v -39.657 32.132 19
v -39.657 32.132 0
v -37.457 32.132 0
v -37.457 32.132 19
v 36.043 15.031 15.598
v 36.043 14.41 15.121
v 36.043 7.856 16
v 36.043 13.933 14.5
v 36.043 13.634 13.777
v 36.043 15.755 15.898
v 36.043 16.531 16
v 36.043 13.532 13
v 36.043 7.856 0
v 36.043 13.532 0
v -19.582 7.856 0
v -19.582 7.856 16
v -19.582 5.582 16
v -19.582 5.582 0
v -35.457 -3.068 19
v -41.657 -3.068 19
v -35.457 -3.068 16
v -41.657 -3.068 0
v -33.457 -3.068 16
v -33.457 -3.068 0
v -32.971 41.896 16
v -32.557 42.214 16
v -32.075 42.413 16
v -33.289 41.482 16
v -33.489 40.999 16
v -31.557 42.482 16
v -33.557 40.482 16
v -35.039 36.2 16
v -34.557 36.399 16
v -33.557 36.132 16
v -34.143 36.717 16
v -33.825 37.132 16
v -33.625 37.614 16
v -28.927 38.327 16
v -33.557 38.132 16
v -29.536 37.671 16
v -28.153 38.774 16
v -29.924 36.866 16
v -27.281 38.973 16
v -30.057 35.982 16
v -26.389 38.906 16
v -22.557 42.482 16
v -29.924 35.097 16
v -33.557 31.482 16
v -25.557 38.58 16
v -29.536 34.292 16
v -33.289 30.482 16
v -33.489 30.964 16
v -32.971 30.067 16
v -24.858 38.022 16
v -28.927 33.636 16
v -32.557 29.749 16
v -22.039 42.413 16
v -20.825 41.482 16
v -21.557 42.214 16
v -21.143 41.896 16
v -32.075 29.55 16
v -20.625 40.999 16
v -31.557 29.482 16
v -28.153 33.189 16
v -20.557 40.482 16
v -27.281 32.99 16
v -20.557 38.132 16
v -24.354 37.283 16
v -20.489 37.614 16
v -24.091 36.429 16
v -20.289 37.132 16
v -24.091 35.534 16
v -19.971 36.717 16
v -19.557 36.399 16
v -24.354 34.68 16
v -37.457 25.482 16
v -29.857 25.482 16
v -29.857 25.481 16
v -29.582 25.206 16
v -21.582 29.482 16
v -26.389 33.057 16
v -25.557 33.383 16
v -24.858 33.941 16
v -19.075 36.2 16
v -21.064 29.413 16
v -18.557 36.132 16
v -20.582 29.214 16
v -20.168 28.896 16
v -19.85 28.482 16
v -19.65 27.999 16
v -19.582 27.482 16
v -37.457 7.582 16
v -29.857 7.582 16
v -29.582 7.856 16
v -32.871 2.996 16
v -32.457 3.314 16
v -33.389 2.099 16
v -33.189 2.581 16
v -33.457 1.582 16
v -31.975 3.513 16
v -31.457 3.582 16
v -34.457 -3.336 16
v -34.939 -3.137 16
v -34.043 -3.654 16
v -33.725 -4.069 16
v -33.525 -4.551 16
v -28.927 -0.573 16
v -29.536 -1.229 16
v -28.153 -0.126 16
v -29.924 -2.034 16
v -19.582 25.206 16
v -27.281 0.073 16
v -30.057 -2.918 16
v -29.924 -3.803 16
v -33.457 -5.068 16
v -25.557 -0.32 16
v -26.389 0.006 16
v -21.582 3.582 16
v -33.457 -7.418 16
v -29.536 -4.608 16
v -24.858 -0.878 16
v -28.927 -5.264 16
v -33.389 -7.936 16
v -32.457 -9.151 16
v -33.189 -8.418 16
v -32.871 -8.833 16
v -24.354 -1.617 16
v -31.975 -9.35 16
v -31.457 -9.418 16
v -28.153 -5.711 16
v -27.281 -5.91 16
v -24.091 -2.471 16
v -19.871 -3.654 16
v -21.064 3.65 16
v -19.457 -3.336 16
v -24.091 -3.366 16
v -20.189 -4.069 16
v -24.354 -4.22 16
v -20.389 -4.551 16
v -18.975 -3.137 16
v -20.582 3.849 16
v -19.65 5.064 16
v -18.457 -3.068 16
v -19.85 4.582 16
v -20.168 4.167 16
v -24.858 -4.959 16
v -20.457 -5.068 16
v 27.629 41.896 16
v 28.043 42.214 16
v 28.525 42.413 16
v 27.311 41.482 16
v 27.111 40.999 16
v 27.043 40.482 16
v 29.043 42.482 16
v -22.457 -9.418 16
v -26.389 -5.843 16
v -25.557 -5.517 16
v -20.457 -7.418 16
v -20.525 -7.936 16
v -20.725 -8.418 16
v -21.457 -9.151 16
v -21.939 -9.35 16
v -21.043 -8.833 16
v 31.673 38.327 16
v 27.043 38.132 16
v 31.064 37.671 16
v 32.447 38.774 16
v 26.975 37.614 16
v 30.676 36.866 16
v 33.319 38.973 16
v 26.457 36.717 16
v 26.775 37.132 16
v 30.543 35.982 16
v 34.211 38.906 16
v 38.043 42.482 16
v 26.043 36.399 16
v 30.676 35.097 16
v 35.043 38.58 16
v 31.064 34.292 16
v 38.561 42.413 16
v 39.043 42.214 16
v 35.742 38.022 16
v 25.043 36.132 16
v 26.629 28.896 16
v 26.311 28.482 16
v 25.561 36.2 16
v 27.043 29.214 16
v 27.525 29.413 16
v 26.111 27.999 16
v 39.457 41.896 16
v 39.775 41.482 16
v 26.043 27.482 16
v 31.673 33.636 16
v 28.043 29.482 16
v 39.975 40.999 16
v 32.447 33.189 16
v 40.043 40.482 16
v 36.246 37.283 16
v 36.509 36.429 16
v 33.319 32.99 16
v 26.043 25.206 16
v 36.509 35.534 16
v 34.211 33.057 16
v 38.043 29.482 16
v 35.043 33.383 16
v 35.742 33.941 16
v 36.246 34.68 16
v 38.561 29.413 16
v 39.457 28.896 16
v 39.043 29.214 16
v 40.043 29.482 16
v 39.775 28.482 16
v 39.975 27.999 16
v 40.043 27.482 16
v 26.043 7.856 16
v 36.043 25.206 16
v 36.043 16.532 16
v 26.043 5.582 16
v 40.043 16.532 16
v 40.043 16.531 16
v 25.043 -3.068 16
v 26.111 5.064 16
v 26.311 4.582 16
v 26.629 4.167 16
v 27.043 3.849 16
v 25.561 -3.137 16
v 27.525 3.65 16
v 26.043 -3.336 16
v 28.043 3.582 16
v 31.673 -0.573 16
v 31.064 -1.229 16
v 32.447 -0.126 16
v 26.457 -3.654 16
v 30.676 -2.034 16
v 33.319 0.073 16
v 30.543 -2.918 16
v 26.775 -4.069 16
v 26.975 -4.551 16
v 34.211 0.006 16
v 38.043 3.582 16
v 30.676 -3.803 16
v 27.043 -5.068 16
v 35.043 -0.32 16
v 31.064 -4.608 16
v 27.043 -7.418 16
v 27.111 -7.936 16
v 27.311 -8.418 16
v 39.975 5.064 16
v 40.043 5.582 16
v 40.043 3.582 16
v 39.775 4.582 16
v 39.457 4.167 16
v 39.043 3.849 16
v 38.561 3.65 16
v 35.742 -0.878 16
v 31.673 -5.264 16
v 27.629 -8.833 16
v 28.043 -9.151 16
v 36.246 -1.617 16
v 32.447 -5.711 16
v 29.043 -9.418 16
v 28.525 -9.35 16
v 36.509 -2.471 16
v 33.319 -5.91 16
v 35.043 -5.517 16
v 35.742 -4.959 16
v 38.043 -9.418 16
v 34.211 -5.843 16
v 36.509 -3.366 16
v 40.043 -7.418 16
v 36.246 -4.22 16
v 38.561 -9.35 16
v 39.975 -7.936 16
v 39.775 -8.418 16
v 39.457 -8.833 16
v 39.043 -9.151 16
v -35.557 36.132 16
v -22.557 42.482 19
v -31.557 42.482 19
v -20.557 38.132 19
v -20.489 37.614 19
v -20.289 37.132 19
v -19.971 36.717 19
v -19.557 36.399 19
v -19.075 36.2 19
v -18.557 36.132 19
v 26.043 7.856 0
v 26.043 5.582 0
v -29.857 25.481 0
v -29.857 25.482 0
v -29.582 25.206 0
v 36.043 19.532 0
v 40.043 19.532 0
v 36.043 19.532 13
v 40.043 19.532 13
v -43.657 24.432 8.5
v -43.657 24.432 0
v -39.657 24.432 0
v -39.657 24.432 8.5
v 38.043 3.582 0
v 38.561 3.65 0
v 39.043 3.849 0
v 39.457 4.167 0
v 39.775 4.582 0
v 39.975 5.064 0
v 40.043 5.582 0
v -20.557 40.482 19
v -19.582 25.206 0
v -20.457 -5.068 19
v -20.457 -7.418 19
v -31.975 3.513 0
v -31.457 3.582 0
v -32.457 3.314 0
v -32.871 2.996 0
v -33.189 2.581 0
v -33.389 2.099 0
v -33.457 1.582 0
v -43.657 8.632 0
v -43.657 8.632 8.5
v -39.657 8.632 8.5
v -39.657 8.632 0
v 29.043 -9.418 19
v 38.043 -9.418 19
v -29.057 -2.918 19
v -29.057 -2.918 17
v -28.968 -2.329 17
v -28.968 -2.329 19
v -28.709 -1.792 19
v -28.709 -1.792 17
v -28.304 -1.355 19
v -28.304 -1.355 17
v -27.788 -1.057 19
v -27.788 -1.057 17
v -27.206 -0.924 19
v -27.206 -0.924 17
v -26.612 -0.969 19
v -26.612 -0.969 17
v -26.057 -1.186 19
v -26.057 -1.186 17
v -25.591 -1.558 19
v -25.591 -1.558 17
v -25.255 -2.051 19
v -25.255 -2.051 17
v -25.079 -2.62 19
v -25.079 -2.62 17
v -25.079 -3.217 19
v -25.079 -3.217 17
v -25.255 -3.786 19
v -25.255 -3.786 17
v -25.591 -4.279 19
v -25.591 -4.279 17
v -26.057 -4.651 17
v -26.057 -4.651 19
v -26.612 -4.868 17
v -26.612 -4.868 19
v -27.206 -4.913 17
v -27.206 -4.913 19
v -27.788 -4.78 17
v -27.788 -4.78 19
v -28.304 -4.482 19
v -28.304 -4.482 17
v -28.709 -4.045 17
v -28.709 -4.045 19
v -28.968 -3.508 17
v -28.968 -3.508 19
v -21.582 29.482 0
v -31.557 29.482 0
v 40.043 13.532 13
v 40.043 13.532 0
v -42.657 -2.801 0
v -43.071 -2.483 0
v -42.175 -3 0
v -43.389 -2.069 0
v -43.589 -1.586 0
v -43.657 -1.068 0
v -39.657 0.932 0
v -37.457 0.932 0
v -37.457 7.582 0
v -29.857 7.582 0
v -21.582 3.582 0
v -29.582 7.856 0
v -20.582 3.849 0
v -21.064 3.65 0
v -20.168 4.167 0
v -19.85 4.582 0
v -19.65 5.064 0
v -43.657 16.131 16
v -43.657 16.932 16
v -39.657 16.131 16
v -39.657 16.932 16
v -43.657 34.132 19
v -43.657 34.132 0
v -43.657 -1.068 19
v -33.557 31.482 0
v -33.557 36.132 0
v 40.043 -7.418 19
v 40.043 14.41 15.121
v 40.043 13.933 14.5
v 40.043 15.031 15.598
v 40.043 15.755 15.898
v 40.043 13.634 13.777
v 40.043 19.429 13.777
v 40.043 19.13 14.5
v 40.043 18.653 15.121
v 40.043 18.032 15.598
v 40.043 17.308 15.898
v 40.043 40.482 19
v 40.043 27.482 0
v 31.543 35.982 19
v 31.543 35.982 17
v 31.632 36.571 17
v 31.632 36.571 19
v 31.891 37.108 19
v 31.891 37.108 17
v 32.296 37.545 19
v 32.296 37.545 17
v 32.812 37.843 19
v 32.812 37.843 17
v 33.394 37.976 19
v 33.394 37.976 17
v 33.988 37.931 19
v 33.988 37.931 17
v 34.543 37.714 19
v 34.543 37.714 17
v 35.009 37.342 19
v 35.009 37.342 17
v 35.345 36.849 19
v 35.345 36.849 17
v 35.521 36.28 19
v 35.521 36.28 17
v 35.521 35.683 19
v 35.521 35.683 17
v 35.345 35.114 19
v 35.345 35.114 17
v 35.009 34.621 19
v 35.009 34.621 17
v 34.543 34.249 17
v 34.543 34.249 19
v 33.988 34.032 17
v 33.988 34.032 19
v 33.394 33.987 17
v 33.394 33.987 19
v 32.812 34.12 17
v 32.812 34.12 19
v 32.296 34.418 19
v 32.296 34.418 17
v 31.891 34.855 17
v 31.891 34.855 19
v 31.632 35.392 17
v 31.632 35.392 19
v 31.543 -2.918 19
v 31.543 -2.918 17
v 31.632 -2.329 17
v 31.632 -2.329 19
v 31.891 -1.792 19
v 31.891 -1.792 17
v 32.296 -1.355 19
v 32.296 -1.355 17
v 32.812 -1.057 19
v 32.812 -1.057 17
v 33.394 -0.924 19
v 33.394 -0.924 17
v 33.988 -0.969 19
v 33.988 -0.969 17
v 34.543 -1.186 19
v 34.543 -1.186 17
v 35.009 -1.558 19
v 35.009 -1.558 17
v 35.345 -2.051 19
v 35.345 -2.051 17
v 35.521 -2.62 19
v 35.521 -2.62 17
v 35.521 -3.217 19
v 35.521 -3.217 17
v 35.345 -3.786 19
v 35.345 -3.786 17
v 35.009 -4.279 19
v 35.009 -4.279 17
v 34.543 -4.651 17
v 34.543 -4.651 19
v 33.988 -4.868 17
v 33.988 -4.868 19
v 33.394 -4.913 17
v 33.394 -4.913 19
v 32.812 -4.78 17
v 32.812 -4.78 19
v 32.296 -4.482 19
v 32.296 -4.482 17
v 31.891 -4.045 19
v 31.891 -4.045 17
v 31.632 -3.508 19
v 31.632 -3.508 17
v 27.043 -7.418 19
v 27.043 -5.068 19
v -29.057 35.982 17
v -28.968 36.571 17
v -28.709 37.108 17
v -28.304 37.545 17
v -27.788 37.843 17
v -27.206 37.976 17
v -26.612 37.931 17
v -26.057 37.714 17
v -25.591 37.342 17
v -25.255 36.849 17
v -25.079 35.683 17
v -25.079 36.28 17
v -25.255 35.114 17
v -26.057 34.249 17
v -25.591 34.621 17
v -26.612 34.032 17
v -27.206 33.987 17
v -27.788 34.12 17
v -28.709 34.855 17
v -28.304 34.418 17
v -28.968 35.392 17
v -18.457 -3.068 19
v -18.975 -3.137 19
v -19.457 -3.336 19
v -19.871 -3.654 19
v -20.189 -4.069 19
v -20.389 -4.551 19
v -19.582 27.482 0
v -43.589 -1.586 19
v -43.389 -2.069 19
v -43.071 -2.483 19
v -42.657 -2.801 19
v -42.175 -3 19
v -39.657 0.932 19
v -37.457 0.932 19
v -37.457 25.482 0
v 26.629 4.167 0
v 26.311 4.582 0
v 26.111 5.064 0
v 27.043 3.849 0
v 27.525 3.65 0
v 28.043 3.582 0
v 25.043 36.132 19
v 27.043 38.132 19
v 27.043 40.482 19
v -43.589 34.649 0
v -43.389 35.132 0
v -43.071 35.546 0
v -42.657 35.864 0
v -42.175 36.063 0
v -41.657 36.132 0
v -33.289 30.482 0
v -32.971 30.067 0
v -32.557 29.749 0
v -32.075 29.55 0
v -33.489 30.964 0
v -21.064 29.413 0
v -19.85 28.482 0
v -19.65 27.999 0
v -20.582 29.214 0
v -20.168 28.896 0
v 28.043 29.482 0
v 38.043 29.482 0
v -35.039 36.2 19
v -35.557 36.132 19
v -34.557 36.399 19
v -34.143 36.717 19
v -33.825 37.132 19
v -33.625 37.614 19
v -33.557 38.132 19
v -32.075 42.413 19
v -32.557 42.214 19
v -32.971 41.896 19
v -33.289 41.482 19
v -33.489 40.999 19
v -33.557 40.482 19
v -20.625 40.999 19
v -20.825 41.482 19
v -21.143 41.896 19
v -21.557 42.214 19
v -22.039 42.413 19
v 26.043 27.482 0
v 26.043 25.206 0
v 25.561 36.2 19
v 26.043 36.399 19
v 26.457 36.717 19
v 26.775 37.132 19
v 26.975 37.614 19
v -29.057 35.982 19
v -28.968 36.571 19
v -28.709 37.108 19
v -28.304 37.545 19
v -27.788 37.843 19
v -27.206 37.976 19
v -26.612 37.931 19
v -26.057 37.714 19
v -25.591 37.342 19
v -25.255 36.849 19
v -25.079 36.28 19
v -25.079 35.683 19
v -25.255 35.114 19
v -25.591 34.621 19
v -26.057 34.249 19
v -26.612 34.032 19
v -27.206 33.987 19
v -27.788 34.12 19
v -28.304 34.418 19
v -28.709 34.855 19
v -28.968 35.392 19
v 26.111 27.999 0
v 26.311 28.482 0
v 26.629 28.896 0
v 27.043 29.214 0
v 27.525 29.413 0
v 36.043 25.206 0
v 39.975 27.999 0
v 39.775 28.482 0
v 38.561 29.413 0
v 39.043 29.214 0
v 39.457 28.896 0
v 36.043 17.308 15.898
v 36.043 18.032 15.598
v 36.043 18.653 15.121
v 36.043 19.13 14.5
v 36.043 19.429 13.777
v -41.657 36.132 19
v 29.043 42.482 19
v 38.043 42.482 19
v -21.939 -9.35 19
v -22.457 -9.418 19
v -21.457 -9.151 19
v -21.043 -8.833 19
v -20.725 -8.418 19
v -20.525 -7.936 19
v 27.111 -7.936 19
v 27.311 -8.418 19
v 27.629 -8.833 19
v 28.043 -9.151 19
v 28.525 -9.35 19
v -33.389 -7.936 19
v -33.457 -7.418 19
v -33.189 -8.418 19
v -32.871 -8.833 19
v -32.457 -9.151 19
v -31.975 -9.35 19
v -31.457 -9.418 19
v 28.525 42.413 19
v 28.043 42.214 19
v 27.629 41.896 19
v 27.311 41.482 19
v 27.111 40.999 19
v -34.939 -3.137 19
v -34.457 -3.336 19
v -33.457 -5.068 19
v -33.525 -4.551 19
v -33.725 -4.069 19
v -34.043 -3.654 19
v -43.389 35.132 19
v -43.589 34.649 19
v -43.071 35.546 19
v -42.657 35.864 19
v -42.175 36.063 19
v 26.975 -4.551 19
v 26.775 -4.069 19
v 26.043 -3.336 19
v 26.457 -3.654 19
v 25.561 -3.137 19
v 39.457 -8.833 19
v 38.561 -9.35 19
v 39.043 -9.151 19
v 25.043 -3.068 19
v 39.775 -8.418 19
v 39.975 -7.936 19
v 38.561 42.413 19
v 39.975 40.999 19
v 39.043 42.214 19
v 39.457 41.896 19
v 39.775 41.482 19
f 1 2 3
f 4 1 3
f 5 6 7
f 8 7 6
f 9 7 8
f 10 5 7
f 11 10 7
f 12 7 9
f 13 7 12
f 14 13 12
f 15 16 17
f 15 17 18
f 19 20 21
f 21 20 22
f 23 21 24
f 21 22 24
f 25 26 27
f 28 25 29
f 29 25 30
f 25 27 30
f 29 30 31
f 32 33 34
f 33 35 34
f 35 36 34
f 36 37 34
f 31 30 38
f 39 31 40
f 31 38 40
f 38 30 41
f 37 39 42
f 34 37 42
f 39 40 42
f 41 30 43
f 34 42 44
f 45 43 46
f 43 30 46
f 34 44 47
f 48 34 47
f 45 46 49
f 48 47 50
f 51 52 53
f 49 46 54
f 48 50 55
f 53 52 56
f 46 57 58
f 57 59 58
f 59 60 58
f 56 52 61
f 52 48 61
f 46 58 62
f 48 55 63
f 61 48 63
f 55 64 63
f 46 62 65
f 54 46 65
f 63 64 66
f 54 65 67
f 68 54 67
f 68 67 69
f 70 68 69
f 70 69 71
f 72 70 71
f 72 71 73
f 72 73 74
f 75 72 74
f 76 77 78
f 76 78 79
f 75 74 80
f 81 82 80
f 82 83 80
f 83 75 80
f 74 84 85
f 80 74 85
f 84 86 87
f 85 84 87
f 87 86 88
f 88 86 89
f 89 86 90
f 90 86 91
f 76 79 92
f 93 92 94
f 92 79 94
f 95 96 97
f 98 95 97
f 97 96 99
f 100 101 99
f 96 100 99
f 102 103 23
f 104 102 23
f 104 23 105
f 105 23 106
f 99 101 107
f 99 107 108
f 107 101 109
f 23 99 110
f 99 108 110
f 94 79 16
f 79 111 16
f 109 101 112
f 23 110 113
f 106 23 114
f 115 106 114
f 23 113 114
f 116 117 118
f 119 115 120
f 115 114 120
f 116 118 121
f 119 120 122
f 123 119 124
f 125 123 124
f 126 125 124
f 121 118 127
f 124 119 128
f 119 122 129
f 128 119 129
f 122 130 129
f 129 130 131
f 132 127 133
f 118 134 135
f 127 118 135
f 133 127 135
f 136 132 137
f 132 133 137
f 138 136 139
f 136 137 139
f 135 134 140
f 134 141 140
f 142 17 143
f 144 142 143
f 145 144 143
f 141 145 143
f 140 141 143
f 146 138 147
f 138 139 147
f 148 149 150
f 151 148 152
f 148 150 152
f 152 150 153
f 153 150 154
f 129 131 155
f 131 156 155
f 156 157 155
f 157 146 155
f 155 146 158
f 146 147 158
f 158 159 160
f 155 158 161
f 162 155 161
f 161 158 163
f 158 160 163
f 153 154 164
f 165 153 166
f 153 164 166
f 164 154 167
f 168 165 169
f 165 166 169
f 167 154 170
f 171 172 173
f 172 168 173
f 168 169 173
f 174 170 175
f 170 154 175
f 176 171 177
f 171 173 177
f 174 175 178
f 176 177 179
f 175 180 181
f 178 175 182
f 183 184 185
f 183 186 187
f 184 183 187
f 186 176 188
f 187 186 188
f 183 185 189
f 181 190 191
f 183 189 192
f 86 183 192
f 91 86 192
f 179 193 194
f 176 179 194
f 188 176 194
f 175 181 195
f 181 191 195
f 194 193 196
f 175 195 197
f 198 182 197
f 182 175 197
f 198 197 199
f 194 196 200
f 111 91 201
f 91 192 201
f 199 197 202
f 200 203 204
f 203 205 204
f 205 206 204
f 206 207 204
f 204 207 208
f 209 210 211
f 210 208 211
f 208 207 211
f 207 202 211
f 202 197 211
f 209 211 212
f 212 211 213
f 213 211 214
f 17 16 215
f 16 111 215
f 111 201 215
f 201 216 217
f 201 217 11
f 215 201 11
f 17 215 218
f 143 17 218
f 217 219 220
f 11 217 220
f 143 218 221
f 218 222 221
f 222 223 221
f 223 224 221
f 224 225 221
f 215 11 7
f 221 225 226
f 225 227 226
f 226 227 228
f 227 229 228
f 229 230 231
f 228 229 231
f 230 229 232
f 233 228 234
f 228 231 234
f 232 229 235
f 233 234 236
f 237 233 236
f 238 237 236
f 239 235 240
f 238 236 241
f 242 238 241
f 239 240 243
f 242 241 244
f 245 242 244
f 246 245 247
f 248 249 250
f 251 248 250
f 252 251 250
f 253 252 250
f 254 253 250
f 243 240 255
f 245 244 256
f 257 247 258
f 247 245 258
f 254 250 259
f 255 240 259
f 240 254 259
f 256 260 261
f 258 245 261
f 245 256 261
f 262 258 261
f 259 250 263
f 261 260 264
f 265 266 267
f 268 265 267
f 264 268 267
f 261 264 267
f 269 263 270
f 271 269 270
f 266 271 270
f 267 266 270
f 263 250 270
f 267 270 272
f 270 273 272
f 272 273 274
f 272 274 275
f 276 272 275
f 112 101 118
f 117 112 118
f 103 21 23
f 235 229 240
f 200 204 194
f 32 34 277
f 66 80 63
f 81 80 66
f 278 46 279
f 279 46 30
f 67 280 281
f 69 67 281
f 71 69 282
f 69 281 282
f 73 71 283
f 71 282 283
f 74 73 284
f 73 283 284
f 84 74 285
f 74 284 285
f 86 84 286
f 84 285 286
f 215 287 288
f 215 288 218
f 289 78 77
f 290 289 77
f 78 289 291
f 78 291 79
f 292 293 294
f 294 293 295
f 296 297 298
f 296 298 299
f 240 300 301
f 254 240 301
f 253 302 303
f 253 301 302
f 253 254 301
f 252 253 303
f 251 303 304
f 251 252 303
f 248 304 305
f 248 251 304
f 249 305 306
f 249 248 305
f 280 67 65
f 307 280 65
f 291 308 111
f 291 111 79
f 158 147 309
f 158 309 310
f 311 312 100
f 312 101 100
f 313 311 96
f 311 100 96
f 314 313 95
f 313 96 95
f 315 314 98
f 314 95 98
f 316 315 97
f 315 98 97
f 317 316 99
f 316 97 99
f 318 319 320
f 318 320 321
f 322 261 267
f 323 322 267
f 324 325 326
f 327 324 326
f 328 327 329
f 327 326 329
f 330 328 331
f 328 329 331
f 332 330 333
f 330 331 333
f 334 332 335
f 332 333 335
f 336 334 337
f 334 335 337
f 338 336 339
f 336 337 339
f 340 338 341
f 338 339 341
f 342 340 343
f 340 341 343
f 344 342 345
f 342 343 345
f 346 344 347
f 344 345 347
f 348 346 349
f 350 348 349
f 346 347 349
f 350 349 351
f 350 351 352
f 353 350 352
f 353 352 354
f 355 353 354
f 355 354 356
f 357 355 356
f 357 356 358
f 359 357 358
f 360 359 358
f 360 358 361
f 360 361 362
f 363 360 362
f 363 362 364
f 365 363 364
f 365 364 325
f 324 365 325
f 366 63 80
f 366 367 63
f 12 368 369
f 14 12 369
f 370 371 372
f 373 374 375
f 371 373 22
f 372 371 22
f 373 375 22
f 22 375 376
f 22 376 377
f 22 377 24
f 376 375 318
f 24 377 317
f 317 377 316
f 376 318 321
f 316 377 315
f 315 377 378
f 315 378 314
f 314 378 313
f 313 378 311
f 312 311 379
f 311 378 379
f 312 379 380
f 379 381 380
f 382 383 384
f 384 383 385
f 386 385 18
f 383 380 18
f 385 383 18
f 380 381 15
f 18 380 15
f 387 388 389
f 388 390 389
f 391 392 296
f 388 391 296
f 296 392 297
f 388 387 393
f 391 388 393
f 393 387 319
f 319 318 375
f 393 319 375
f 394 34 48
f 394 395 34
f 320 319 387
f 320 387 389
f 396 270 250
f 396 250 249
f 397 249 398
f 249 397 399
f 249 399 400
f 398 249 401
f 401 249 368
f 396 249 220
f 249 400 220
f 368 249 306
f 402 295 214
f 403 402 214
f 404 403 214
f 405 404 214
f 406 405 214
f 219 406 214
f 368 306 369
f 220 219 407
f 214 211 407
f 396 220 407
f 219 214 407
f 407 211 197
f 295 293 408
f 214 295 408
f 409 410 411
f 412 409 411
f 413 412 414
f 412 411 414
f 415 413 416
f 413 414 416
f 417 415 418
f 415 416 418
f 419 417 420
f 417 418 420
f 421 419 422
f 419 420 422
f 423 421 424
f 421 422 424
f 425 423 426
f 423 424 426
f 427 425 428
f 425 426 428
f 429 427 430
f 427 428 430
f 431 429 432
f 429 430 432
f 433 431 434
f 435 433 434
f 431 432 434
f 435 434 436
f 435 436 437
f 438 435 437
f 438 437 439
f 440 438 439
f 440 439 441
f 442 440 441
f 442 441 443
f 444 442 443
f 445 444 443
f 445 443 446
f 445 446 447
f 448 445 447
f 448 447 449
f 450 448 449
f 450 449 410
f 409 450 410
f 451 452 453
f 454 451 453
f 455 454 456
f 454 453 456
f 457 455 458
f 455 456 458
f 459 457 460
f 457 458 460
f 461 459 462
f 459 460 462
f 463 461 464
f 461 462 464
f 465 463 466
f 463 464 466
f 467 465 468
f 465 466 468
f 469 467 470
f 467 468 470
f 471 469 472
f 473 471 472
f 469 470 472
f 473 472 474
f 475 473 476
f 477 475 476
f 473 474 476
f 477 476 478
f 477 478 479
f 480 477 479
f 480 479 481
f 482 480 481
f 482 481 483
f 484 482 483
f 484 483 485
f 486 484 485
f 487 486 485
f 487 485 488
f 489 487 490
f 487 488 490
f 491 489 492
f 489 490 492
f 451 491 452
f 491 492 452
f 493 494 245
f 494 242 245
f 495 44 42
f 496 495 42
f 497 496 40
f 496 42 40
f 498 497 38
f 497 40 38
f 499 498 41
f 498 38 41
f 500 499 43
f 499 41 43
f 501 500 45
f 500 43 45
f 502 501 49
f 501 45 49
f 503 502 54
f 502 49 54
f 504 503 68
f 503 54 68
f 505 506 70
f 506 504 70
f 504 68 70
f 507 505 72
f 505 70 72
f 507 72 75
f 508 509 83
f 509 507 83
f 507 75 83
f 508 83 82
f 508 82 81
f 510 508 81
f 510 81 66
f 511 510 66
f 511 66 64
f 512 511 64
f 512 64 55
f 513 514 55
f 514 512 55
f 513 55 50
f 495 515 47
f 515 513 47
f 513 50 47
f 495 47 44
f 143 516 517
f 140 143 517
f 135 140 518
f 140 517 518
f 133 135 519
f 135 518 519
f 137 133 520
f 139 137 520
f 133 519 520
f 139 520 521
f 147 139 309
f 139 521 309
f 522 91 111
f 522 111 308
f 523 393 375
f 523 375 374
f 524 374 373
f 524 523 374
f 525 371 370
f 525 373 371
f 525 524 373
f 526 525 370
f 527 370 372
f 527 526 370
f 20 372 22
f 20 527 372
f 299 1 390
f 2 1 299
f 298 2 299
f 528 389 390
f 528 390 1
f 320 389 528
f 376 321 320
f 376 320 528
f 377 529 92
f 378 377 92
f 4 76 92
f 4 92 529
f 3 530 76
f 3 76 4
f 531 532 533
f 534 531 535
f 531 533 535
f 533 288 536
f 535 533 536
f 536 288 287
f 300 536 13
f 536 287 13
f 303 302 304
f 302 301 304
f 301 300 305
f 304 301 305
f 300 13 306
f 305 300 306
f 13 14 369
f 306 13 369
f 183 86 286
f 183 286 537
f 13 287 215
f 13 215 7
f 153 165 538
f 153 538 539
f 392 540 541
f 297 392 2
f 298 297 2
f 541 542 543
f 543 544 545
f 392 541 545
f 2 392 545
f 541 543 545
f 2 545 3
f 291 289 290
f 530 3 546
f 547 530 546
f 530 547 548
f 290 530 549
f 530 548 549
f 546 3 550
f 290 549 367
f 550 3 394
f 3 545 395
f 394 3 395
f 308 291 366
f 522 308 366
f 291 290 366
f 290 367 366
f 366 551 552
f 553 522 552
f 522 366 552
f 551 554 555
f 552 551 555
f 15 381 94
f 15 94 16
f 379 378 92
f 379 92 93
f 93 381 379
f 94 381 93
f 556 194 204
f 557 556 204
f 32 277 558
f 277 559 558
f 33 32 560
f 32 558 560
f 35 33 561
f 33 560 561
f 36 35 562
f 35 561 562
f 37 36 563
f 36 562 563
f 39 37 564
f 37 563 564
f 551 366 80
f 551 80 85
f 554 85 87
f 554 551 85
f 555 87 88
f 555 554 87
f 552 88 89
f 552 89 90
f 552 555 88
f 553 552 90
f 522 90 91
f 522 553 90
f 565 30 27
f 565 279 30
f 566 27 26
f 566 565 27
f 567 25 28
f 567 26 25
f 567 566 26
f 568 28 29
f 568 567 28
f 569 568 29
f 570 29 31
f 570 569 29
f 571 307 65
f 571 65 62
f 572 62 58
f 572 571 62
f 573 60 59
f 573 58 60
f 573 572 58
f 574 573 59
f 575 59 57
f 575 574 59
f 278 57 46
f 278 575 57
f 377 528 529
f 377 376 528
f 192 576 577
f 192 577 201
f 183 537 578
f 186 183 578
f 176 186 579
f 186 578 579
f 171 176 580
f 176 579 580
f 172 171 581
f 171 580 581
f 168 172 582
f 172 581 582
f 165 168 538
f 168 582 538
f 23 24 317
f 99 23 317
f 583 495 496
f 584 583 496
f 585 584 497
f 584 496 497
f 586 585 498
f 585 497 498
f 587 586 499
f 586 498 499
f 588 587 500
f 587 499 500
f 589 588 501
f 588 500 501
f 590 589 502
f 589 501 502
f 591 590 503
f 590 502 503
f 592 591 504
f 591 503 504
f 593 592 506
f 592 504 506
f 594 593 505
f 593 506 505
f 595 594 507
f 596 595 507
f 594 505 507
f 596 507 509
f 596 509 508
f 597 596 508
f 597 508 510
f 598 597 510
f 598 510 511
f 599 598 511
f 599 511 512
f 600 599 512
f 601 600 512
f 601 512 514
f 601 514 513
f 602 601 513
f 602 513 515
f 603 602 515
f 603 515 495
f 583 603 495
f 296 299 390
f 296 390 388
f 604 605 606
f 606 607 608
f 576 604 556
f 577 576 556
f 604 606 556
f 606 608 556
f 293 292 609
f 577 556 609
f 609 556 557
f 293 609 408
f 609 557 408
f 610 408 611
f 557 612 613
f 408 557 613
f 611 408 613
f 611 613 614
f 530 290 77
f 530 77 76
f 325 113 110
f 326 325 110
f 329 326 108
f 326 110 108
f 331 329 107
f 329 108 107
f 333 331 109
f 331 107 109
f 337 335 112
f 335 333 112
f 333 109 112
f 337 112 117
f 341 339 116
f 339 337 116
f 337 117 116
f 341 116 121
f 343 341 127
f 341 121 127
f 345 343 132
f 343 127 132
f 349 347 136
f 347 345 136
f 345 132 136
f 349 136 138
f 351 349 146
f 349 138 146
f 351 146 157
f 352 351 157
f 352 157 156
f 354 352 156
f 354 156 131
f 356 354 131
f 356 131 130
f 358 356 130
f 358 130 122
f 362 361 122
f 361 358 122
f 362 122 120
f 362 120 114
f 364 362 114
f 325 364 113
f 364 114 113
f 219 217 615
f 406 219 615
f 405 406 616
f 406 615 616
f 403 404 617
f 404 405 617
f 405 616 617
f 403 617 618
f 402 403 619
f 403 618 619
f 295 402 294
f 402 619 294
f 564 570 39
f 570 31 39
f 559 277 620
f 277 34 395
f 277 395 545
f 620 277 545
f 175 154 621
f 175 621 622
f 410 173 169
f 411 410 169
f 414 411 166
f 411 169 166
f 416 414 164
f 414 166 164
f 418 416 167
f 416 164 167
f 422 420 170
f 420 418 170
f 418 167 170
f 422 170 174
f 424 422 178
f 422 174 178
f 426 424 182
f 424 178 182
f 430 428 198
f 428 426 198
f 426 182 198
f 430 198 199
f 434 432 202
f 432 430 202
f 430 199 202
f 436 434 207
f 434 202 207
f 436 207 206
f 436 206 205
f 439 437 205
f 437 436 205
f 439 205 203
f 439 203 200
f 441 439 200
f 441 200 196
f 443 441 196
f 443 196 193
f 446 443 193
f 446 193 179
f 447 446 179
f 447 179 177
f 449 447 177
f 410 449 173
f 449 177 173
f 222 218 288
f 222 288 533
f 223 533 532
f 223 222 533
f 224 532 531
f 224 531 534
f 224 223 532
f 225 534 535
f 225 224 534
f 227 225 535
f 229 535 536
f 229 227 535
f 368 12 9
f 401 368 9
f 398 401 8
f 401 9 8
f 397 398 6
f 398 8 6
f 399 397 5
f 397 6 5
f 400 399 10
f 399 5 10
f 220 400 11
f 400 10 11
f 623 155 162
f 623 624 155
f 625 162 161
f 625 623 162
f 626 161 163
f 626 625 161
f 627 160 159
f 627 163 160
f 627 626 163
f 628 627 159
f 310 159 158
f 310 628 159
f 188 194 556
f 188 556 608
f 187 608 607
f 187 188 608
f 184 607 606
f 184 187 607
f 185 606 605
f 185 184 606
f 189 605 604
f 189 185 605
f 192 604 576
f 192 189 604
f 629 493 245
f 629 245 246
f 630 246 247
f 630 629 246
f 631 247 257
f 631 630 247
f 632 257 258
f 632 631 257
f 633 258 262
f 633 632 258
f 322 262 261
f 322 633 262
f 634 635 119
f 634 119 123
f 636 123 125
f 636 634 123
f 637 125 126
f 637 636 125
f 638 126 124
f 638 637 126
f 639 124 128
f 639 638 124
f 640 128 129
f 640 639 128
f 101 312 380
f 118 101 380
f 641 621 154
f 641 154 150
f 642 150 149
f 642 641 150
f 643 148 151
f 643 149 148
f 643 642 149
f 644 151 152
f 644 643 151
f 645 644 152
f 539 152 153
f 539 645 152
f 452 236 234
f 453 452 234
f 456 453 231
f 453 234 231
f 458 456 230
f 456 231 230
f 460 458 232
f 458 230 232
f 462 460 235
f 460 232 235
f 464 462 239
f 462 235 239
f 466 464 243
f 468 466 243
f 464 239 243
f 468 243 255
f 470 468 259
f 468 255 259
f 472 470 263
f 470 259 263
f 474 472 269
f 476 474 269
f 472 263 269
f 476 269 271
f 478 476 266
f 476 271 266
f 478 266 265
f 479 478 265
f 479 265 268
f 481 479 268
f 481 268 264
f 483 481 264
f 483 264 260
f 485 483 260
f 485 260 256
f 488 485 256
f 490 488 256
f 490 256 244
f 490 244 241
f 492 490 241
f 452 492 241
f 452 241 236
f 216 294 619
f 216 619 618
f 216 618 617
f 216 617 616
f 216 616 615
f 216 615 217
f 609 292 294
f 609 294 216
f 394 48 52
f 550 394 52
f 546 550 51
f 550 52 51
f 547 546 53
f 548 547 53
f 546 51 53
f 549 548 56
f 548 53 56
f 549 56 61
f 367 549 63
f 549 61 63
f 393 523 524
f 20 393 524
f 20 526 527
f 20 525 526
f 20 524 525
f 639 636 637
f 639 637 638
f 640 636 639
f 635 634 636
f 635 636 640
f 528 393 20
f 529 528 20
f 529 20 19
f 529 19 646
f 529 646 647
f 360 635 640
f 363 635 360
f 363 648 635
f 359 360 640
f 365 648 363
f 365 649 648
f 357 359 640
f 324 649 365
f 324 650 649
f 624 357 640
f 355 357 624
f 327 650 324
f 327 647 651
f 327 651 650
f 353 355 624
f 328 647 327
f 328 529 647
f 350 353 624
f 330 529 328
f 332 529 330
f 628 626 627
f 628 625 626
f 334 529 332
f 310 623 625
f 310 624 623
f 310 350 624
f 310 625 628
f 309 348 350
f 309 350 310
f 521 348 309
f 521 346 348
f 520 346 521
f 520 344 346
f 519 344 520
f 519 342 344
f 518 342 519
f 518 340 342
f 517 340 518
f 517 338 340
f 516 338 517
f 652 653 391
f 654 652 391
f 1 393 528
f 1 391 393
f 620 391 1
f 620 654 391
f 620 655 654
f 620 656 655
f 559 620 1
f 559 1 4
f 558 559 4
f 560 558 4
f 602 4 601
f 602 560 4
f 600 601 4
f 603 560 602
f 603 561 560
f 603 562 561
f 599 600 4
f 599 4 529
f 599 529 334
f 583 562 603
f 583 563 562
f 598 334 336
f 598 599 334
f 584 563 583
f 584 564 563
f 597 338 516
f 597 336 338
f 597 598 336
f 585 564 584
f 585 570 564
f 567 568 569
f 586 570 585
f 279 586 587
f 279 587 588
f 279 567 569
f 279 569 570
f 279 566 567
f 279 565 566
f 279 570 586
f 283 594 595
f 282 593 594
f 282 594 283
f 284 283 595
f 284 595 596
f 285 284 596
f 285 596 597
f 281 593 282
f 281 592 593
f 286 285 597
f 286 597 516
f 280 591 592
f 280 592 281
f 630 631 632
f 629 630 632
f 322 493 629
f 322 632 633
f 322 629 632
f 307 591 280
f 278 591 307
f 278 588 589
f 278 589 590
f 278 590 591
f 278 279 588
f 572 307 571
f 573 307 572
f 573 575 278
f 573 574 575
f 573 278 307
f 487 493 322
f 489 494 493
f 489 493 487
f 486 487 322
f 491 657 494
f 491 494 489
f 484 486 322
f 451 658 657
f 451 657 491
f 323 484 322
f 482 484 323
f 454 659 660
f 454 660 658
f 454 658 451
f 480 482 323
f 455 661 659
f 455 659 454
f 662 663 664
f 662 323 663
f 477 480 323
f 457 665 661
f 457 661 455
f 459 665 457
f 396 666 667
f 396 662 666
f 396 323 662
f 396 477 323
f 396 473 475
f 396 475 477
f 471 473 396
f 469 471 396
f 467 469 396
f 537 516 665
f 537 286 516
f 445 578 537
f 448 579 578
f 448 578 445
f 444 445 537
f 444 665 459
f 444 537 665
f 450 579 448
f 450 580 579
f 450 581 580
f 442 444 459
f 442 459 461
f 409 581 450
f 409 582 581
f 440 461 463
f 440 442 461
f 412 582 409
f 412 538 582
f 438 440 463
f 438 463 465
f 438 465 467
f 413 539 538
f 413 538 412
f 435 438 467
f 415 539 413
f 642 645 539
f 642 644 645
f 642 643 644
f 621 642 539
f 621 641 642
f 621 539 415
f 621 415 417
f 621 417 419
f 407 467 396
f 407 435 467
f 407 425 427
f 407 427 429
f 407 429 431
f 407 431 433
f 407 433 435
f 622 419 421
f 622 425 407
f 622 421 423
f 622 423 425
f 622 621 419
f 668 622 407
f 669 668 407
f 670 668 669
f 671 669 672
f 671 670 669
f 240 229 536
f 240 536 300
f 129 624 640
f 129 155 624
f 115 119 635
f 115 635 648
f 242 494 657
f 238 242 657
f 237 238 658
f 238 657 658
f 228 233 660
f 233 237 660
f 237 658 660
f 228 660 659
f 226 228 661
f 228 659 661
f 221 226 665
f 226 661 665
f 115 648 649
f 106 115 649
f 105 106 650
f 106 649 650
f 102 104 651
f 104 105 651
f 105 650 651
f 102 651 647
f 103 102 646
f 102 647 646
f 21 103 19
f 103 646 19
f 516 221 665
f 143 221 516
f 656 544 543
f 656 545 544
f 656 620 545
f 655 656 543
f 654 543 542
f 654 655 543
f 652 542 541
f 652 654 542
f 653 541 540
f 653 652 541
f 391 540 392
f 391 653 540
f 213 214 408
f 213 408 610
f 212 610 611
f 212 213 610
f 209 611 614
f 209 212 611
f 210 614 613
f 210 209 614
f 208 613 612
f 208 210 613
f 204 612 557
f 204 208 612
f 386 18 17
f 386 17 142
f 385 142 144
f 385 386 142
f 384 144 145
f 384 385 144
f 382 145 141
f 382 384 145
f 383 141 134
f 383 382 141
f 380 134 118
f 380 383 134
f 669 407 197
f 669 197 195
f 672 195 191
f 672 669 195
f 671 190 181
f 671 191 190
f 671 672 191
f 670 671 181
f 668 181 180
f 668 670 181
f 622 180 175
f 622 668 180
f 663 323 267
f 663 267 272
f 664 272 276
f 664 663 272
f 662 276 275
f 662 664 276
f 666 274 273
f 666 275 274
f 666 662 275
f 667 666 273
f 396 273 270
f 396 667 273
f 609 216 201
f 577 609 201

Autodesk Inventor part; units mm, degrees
ref_plane "YZ Plane" through (0, 0, 0) normal (1, 0, 0) x (0, 1, 0)
ref_plane "XZ Plane" through (0, 0, 0) normal (0, 1, 0) x (-1, 0, 0)
ref_plane "XY Plane" through (0, 0, 0) normal (0, 0, 1) x (1, 0, 0)
sketch "Sketch1" plane through (0, 0, 0) normal (0, 0, 1) x (1, 0, 0)
  line L0 (-33.557, 36.1315) -> (-43.657, 36.1315)
  line L1 (-43.657, 36.1315) -> (-43.657, -3.0685)
  line L2 (-43.657, -3.0685) -> (-33.457, -3.0685)
  line L3 (40.043, 3.5815) -> (40.043, 29.4815)
  line L4 (35.943, 25.1065) -> (35.943, 7.9565) construction
  line L5 (35.943, 7.9565) -> (-29.957, 7.9565) construction
  line L6 (35.943, 25.1065) -> (-29.957, 25.1065) construction
  line L7 (-37.557, 25.3815) -> (-29.957, 25.3815) construction
  line L8 (-29.957, 7.6815) -> (-29.957, 25.3815) construction
  line L9 (-37.557, 7.6815) -> (-29.957, 7.6815) construction
  line L10 (-37.557, 1.0315) -> (-37.557, 6.1295) construction
  line L11 (-39.557, 1.0315) -> (-37.557, 1.0315) construction
  line L12 (-39.557, 6.1295) -> (-39.557, 1.0315) construction
  line L13 (-39.557, 13.2232) -> (-39.557, 6.1295) construction
  line L14 (-39.557, 19.8398) -> (-39.557, 13.2232) construction
  line L15 (-39.557, 26.9336) -> (-39.557, 19.8398) construction
  line L16 (-39.557, 32.0315) -> (-39.557, 26.9336) construction
  line L17 (-39.557, 32.0315) -> (-37.557, 32.0315) construction
  line L18 (-37.557, 26.9336) -> (-37.557, 32.0315) construction
  line L19 (-37.557, 19.8398) -> (-37.557, 26.9336) construction
  line L20 (-37.557, 6.1295) -> (-37.557, 13.2232) construction
  line L21 (-33.557, 36.1315) -> (-33.557, 29.4815) construction
  line L22 (-33.557, 29.4815) -> (40.043, 29.4815) construction
  line L23 (35.943, 25.1065) -> (-29.957, 25.1065) construction
  line L24 (-29.957, 25.3815) -> (-29.957, 25.1065) construction
  line L25 (-29.957, 25.3815) -> (-37.557, 25.3815) construction
  line L26 (-37.557, 25.3815) -> (-37.557, 32.0315) construction
  line L27 (-37.557, 32.0315) -> (-39.557, 32.0315) construction
  line L28 (-39.557, 32.0315) -> (-39.557, 1.0315) construction
  line L29 (-39.557, 1.0315) -> (-37.557, 1.0315) construction
  line L30 (-37.557, 1.0315) -> (-37.557, 7.6815) construction
  line L31 (-37.557, 7.6815) -> (-29.957, 7.6815) construction
  line L32 (-29.957, 7.6815) -> (-29.957, 7.9565) construction
  line L33 (-29.957, 7.9565) -> (35.943, 7.9565) construction
  line L34 (35.943, 7.9565) -> (35.943, 25.1065) construction
  line L35 (-29.857, 7.8565) -> (36.043, 7.8565)
  line L36 (36.043, 7.8565) -> (36.043, 25.2065)
  line L37 (36.043, 25.2065) -> (-29.857, 25.2065)
  line L38 (-29.857, 25.2065) -> (-29.857, 25.4815)
  line L39 (-29.857, 25.4815) -> (-37.457, 25.4815)
  line L40 (-37.457, 25.4815) -> (-37.457, 32.1315)
  line L41 (-37.457, 32.1315) -> (-39.657, 32.1315)
  line L42 (-39.657, 32.1315) -> (-39.657, 0.9315)
  line L43 (-39.657, 0.9315) -> (-37.457, 0.9315)
  line L44 (-37.457, 0.9315) -> (-37.457, 7.5815)
  line L45 (-37.457, 7.5815) -> (-29.857, 7.5815)
  line L46 (-29.857, 7.5815) -> (-29.857, 7.8565)
  line L47 (-33.557, 36.1315) -> (-33.557, 29.4815)
  line L48 (-33.557, 29.4815) -> (40.043, 29.4815)
  line L49 (-33.457, -3.0685) -> (-33.457, 3.5815)
  line L50 (-33.457, 3.5815) -> (40.043, 3.5815)
  line L51 (-33.457, 36.1315) -> (-33.557, 36.1315)
  line L52 (-33.457, 36.1315) -> (-33.557, 36.1315)
  point P0 (0, 0)
  dimension "d6" = 0.1
  dimension "d7" = 4
  dimension "d8" = 4
  dimension "d9" = 4
  dimension "d10" = 4
  dimension "d11" = 4
  dimension "d12" = 4
  dimension "d13" = 4
  dimension "d14" = 4
extrude "Extrusion1" add sketch "Sketch1" along normal blind 16
sketch "Sketch2" plane through (0, 0, 16) normal (0, 0, 1) x (1, 0, 0)
  line L0 (-43.657, 36.1315) -> (-43.657, -3.0685) projected
  line L1 (-43.657, -3.0685) -> (-43.657, 36.1315)
  line L2 (40.043, 36.1315) -> (40.043, -3.0685)
  line L3 (-43.657, -3.0685) -> (-33.457, -3.0685) projected
  line L4 (40.043, 3.5815) -> (40.043, 29.4815) projected
  line L5 (40.043, 29.4815) -> (27.043, 29.4815) construction
  line L6 (27.043, 36.1315) -> (27.043, 42.4815)
  line L7 (27.043, 42.4815) -> (40.043, 42.4815)
  line L8 (40.043, 42.4815) -> (40.043, 29.4815)
  line L9 (-33.557, 29.4815) -> (-33.557, 36.1315) construction
  line L10 (-33.557, 29.4815) -> (-20.557, 29.4815) construction
  line L11 (-20.557, 36.1315) -> (-20.557, 42.4815)
  line L12 (-20.557, 42.4815) -> (-33.557, 42.4815)
  line L13 (-33.557, 42.4815) -> (-33.557, 36.1315)
  line L14 (-33.457, 3.5815) -> (40.043, 3.5815) construction
  line L15 (-20.557, 3.5815) -> (-20.457, 3.5815)
  line L16 (-20.457, -3.0685) -> (-20.457, -9.4185)
  line L17 (-20.457, -9.4185) -> (-33.457, -9.4185)
  line L18 (-33.457, -9.4185) -> (-33.457, -3.0685)
  line L19 (40.043, 3.5815) -> (27.043, 3.5815) construction
  line L20 (27.043, -3.0685) -> (27.043, -9.4185)
  line L21 (27.043, -9.4185) -> (40.043, -9.4185)
  line L22 (40.043, -9.4185) -> (40.043, 3.5815)
  line L23 (27.043, -3.0685) -> (-20.457, -3.0685)
  line L24 (-33.457, -3.0685) -> (-43.657, -3.0685)
  line L25 (-43.657, 36.1315) -> (-33.557, 36.1315)
  line L26 (-20.557, 36.1315) -> (27.043, 36.1315)
  point P0 (0, 0)
  point P1 (-38.557, -3.0685)
  point P2 (40.043, 16.5315)
  dimension "d60" = 13
  dimension "d61" = 13
  dimension "d62" = 13
  dimension "d63" = 13
  dimension "d64" = 13
  dimension "d65" = 13
  dimension "d66" = 13
  dimension "d67" = 13
extrude "Extrusion2" add sketch "Sketch2" along normal blind 3
sketch "Sketch3" plane through (40.043, 3.5815, 0) normal (1, 0, 0) x (0, 0, -1)
  line L0 (0, 15.95) -> (-16, 15.95)
  line L1 (-16, 15.95) -> (-16, 9.95)
  line L2 (-16, 9.95) -> (0, 9.95)
  line L3 (0, 9.95) -> (0, 15.95)
  line L4 (0, 0) -> (0, 25.9) construction
  line L5 (0, 25.9) -> (-16, 25.9) construction
  line L6 (0, 0) -> (-16, 0) construction
  line L7 (-16, 21.625) -> (-16, 4.275) construction
  point P0 (0, -3.5815)
  point P1 (0, 12.95)
  dimension "d19" = 6
  dimension "d21" = 0
extrude "Extrusion3" cut sketch "Sketch3" against normal blind 4
fillet "Fillet1" radius 3 2 edges at (38.043, 19.5315, 16) (38.043, 13.5315, 16)
sketch "Sketch4" plane through (-43.657, -3.0685, 0) normal (-1, 0, 0) x (0, 0, 1)
  line L0 (0, 27.5) -> (16, 27.5)
  line L1 (16, 27.5) -> (16, 11.7)
  line L2 (16, 11.7) -> (0, 11.7)
  line L3 (0, 11.7) -> (0, 27.5)
  line L4 (0, 39.2) -> (0, 0) construction
  line L5 (0, 39.2) -> (19, 39.2) construction
  line L6 (0, 0) -> (19, 0) construction
  line L7 (19, 39.2) -> (19, 0) construction
  point P0 (0, 3.0685)
  point P1 (0, 19.6)
  dimension "d25" = 15.8
  dimension "d28" = 11.7
  dimension "d29" = 11.7
  dimension "d30" = 3
extrude "Extrusion4" cut sketch "Sketch4" against normal blind 4
chamfer "Chamfer1" distance 7.5 angle 45 2 edges at (-41.657, 8.6315, 16) (-41.657, 24.4315, 16)
sketch "Sketch5" plane through (0, 0, 16) normal (0, 0, -1) x (-1, 0, 0)
  circle A0 centre (-33.543, 35.9815) radius 2
  circle A1 centre (27.057, 35.9815) radius 2
  circle A2 centre (27.057, -2.9185) radius 2
  circle A3 centre (-33.543, -2.9185) radius 2
  line L0 (-40.043, 29.4815) -> (-40.043, 3.5815) projected
  line L1 (-40.043, 36.1315) -> (33.557, 36.1315) projected
  line L2 (-40.043, 29.4815) -> (33.557, 29.4815) projected
  line L3 (-40.043, -9.4185) -> (-40.043, 3.5815) projected
  line L4 (33.457, -3.0685) -> (-27.043, -3.0685) projected
  line L5 (33.457, -3.0685) -> (33.457, 3.5815) projected
  line L6 (20.557, 42.4815) -> (33.557, 42.4815) projected
  line L7 (33.457, -9.4185) -> (20.457, -9.4185) projected
  line L8 (-27.043, -9.4185) -> (-40.043, -9.4185) projected
  point P0 (0, 0)
  point P1 (-40.043, -3.0685)
  point P2 (27.057, 42.4815)
  point P3 (-33.543, -9.4185)
  dimension "d39" = 4
  dimension "d68" = 6.5
  dimension "d69" = 6.5
extrude "Extrusion5" cut sketch "Sketch5" against normal blind 4
chamfer "Chamfer2" distance 1 angle 45 4 edges at (35.543, 35.9815, 16) (35.543, -2.9185, 16) (-25.057, 35.9815, 16) (-25.057, -2.9185, 16)
chamfer "Chamfer3" distance 0.275 angle 45 2 edges at (-29.857, 25.2065, 8) (-29.857, 7.8565, 8)
sketch "Sketch6" plane through (0, 0, 0) normal (0, 0, -1) x (-1, 0, 0)
  line L0 (37.457, 0.9315) -> (39.657, 0.9315) projected
  line L1 (39.657, 32.1315) -> (37.457, 32.1315)
  line L2 (37.457, 32.1315) -> (37.457, 0.9315)
  line L3 (37.457, 0.9315) -> (39.657, 0.9315)
  line L4 (39.657, 0.9315) -> (39.657, 32.1315)
  point P0 (0, 0)
extrude "Extrusion6" cut sketch "Sketch6" against normal through all
sketch "Sketch7" plane through (-33.557, 29.4815, 0) normal (0, 1, 0) x (1, 0, 0)
  line L0 (3.7, 0) -> (3.7, -16) construction
  line L1 (3.975, -16) -> (3.975, 0) construction
  line L2 (69.6, 0) -> (69.6, -16) construction
  line L3 (13.975, 0) -> (59.6, 0)
  line L4 (59.6, 0) -> (59.6, -16)
  line L5 (59.6, -16) -> (13.975, -16)
  line L6 (13.975, -16) -> (13.975, 0)
  line L7 (73.6, -16) -> (0, -16) construction
  point P0 (33.557, 0)
  point P1 (36.7875, -16)
  point P2 (36.8, -16)
  dimension "d56" = 10
  dimension "d57" = 10
extrude "Extrusion7" cut sketch "Sketch7" against normal through all
fillet "Fillet2" radius 2 24 edges at (-33.557, 42.4815, 17.5) (-20.557, 42.4815, 17.5) (27.043, 42.4815, 17.5) (40.043, 42.4815, 17.5) (27.043, -9.4185, 17.5) (40.043, -9.4185, 17.5) (-20.457, -9.4185, 17.5) (-33.457, -9.4185, 17.5) (-43.657, -3.0685, 9.5) (-43.657, 36.1315, 9.5) (-19.582, 29.4815, 8) (-19.582, 3.5815, 8) (40.043, 29.4815, 8) (40.043, 3.5815, 8) (26.043, 3.5815, 8) (26.043, 29.4815, 8) (27.043, 36.1315, 17.5) (-20.557, 36.1315, 17.5) (-33.557, 36.1315, 17.5) (-33.557, 29.4815, 8) (-33.457, 3.5815, 8) (-20.457, -3.0685, 17.5) (27.043, -3.0685, 17.5) (-33.457, -3.0685, 17.5)
equation "\"d28\" = d29"
equation "\"d69\" = d68"
properties part number "SyringeCasing"
